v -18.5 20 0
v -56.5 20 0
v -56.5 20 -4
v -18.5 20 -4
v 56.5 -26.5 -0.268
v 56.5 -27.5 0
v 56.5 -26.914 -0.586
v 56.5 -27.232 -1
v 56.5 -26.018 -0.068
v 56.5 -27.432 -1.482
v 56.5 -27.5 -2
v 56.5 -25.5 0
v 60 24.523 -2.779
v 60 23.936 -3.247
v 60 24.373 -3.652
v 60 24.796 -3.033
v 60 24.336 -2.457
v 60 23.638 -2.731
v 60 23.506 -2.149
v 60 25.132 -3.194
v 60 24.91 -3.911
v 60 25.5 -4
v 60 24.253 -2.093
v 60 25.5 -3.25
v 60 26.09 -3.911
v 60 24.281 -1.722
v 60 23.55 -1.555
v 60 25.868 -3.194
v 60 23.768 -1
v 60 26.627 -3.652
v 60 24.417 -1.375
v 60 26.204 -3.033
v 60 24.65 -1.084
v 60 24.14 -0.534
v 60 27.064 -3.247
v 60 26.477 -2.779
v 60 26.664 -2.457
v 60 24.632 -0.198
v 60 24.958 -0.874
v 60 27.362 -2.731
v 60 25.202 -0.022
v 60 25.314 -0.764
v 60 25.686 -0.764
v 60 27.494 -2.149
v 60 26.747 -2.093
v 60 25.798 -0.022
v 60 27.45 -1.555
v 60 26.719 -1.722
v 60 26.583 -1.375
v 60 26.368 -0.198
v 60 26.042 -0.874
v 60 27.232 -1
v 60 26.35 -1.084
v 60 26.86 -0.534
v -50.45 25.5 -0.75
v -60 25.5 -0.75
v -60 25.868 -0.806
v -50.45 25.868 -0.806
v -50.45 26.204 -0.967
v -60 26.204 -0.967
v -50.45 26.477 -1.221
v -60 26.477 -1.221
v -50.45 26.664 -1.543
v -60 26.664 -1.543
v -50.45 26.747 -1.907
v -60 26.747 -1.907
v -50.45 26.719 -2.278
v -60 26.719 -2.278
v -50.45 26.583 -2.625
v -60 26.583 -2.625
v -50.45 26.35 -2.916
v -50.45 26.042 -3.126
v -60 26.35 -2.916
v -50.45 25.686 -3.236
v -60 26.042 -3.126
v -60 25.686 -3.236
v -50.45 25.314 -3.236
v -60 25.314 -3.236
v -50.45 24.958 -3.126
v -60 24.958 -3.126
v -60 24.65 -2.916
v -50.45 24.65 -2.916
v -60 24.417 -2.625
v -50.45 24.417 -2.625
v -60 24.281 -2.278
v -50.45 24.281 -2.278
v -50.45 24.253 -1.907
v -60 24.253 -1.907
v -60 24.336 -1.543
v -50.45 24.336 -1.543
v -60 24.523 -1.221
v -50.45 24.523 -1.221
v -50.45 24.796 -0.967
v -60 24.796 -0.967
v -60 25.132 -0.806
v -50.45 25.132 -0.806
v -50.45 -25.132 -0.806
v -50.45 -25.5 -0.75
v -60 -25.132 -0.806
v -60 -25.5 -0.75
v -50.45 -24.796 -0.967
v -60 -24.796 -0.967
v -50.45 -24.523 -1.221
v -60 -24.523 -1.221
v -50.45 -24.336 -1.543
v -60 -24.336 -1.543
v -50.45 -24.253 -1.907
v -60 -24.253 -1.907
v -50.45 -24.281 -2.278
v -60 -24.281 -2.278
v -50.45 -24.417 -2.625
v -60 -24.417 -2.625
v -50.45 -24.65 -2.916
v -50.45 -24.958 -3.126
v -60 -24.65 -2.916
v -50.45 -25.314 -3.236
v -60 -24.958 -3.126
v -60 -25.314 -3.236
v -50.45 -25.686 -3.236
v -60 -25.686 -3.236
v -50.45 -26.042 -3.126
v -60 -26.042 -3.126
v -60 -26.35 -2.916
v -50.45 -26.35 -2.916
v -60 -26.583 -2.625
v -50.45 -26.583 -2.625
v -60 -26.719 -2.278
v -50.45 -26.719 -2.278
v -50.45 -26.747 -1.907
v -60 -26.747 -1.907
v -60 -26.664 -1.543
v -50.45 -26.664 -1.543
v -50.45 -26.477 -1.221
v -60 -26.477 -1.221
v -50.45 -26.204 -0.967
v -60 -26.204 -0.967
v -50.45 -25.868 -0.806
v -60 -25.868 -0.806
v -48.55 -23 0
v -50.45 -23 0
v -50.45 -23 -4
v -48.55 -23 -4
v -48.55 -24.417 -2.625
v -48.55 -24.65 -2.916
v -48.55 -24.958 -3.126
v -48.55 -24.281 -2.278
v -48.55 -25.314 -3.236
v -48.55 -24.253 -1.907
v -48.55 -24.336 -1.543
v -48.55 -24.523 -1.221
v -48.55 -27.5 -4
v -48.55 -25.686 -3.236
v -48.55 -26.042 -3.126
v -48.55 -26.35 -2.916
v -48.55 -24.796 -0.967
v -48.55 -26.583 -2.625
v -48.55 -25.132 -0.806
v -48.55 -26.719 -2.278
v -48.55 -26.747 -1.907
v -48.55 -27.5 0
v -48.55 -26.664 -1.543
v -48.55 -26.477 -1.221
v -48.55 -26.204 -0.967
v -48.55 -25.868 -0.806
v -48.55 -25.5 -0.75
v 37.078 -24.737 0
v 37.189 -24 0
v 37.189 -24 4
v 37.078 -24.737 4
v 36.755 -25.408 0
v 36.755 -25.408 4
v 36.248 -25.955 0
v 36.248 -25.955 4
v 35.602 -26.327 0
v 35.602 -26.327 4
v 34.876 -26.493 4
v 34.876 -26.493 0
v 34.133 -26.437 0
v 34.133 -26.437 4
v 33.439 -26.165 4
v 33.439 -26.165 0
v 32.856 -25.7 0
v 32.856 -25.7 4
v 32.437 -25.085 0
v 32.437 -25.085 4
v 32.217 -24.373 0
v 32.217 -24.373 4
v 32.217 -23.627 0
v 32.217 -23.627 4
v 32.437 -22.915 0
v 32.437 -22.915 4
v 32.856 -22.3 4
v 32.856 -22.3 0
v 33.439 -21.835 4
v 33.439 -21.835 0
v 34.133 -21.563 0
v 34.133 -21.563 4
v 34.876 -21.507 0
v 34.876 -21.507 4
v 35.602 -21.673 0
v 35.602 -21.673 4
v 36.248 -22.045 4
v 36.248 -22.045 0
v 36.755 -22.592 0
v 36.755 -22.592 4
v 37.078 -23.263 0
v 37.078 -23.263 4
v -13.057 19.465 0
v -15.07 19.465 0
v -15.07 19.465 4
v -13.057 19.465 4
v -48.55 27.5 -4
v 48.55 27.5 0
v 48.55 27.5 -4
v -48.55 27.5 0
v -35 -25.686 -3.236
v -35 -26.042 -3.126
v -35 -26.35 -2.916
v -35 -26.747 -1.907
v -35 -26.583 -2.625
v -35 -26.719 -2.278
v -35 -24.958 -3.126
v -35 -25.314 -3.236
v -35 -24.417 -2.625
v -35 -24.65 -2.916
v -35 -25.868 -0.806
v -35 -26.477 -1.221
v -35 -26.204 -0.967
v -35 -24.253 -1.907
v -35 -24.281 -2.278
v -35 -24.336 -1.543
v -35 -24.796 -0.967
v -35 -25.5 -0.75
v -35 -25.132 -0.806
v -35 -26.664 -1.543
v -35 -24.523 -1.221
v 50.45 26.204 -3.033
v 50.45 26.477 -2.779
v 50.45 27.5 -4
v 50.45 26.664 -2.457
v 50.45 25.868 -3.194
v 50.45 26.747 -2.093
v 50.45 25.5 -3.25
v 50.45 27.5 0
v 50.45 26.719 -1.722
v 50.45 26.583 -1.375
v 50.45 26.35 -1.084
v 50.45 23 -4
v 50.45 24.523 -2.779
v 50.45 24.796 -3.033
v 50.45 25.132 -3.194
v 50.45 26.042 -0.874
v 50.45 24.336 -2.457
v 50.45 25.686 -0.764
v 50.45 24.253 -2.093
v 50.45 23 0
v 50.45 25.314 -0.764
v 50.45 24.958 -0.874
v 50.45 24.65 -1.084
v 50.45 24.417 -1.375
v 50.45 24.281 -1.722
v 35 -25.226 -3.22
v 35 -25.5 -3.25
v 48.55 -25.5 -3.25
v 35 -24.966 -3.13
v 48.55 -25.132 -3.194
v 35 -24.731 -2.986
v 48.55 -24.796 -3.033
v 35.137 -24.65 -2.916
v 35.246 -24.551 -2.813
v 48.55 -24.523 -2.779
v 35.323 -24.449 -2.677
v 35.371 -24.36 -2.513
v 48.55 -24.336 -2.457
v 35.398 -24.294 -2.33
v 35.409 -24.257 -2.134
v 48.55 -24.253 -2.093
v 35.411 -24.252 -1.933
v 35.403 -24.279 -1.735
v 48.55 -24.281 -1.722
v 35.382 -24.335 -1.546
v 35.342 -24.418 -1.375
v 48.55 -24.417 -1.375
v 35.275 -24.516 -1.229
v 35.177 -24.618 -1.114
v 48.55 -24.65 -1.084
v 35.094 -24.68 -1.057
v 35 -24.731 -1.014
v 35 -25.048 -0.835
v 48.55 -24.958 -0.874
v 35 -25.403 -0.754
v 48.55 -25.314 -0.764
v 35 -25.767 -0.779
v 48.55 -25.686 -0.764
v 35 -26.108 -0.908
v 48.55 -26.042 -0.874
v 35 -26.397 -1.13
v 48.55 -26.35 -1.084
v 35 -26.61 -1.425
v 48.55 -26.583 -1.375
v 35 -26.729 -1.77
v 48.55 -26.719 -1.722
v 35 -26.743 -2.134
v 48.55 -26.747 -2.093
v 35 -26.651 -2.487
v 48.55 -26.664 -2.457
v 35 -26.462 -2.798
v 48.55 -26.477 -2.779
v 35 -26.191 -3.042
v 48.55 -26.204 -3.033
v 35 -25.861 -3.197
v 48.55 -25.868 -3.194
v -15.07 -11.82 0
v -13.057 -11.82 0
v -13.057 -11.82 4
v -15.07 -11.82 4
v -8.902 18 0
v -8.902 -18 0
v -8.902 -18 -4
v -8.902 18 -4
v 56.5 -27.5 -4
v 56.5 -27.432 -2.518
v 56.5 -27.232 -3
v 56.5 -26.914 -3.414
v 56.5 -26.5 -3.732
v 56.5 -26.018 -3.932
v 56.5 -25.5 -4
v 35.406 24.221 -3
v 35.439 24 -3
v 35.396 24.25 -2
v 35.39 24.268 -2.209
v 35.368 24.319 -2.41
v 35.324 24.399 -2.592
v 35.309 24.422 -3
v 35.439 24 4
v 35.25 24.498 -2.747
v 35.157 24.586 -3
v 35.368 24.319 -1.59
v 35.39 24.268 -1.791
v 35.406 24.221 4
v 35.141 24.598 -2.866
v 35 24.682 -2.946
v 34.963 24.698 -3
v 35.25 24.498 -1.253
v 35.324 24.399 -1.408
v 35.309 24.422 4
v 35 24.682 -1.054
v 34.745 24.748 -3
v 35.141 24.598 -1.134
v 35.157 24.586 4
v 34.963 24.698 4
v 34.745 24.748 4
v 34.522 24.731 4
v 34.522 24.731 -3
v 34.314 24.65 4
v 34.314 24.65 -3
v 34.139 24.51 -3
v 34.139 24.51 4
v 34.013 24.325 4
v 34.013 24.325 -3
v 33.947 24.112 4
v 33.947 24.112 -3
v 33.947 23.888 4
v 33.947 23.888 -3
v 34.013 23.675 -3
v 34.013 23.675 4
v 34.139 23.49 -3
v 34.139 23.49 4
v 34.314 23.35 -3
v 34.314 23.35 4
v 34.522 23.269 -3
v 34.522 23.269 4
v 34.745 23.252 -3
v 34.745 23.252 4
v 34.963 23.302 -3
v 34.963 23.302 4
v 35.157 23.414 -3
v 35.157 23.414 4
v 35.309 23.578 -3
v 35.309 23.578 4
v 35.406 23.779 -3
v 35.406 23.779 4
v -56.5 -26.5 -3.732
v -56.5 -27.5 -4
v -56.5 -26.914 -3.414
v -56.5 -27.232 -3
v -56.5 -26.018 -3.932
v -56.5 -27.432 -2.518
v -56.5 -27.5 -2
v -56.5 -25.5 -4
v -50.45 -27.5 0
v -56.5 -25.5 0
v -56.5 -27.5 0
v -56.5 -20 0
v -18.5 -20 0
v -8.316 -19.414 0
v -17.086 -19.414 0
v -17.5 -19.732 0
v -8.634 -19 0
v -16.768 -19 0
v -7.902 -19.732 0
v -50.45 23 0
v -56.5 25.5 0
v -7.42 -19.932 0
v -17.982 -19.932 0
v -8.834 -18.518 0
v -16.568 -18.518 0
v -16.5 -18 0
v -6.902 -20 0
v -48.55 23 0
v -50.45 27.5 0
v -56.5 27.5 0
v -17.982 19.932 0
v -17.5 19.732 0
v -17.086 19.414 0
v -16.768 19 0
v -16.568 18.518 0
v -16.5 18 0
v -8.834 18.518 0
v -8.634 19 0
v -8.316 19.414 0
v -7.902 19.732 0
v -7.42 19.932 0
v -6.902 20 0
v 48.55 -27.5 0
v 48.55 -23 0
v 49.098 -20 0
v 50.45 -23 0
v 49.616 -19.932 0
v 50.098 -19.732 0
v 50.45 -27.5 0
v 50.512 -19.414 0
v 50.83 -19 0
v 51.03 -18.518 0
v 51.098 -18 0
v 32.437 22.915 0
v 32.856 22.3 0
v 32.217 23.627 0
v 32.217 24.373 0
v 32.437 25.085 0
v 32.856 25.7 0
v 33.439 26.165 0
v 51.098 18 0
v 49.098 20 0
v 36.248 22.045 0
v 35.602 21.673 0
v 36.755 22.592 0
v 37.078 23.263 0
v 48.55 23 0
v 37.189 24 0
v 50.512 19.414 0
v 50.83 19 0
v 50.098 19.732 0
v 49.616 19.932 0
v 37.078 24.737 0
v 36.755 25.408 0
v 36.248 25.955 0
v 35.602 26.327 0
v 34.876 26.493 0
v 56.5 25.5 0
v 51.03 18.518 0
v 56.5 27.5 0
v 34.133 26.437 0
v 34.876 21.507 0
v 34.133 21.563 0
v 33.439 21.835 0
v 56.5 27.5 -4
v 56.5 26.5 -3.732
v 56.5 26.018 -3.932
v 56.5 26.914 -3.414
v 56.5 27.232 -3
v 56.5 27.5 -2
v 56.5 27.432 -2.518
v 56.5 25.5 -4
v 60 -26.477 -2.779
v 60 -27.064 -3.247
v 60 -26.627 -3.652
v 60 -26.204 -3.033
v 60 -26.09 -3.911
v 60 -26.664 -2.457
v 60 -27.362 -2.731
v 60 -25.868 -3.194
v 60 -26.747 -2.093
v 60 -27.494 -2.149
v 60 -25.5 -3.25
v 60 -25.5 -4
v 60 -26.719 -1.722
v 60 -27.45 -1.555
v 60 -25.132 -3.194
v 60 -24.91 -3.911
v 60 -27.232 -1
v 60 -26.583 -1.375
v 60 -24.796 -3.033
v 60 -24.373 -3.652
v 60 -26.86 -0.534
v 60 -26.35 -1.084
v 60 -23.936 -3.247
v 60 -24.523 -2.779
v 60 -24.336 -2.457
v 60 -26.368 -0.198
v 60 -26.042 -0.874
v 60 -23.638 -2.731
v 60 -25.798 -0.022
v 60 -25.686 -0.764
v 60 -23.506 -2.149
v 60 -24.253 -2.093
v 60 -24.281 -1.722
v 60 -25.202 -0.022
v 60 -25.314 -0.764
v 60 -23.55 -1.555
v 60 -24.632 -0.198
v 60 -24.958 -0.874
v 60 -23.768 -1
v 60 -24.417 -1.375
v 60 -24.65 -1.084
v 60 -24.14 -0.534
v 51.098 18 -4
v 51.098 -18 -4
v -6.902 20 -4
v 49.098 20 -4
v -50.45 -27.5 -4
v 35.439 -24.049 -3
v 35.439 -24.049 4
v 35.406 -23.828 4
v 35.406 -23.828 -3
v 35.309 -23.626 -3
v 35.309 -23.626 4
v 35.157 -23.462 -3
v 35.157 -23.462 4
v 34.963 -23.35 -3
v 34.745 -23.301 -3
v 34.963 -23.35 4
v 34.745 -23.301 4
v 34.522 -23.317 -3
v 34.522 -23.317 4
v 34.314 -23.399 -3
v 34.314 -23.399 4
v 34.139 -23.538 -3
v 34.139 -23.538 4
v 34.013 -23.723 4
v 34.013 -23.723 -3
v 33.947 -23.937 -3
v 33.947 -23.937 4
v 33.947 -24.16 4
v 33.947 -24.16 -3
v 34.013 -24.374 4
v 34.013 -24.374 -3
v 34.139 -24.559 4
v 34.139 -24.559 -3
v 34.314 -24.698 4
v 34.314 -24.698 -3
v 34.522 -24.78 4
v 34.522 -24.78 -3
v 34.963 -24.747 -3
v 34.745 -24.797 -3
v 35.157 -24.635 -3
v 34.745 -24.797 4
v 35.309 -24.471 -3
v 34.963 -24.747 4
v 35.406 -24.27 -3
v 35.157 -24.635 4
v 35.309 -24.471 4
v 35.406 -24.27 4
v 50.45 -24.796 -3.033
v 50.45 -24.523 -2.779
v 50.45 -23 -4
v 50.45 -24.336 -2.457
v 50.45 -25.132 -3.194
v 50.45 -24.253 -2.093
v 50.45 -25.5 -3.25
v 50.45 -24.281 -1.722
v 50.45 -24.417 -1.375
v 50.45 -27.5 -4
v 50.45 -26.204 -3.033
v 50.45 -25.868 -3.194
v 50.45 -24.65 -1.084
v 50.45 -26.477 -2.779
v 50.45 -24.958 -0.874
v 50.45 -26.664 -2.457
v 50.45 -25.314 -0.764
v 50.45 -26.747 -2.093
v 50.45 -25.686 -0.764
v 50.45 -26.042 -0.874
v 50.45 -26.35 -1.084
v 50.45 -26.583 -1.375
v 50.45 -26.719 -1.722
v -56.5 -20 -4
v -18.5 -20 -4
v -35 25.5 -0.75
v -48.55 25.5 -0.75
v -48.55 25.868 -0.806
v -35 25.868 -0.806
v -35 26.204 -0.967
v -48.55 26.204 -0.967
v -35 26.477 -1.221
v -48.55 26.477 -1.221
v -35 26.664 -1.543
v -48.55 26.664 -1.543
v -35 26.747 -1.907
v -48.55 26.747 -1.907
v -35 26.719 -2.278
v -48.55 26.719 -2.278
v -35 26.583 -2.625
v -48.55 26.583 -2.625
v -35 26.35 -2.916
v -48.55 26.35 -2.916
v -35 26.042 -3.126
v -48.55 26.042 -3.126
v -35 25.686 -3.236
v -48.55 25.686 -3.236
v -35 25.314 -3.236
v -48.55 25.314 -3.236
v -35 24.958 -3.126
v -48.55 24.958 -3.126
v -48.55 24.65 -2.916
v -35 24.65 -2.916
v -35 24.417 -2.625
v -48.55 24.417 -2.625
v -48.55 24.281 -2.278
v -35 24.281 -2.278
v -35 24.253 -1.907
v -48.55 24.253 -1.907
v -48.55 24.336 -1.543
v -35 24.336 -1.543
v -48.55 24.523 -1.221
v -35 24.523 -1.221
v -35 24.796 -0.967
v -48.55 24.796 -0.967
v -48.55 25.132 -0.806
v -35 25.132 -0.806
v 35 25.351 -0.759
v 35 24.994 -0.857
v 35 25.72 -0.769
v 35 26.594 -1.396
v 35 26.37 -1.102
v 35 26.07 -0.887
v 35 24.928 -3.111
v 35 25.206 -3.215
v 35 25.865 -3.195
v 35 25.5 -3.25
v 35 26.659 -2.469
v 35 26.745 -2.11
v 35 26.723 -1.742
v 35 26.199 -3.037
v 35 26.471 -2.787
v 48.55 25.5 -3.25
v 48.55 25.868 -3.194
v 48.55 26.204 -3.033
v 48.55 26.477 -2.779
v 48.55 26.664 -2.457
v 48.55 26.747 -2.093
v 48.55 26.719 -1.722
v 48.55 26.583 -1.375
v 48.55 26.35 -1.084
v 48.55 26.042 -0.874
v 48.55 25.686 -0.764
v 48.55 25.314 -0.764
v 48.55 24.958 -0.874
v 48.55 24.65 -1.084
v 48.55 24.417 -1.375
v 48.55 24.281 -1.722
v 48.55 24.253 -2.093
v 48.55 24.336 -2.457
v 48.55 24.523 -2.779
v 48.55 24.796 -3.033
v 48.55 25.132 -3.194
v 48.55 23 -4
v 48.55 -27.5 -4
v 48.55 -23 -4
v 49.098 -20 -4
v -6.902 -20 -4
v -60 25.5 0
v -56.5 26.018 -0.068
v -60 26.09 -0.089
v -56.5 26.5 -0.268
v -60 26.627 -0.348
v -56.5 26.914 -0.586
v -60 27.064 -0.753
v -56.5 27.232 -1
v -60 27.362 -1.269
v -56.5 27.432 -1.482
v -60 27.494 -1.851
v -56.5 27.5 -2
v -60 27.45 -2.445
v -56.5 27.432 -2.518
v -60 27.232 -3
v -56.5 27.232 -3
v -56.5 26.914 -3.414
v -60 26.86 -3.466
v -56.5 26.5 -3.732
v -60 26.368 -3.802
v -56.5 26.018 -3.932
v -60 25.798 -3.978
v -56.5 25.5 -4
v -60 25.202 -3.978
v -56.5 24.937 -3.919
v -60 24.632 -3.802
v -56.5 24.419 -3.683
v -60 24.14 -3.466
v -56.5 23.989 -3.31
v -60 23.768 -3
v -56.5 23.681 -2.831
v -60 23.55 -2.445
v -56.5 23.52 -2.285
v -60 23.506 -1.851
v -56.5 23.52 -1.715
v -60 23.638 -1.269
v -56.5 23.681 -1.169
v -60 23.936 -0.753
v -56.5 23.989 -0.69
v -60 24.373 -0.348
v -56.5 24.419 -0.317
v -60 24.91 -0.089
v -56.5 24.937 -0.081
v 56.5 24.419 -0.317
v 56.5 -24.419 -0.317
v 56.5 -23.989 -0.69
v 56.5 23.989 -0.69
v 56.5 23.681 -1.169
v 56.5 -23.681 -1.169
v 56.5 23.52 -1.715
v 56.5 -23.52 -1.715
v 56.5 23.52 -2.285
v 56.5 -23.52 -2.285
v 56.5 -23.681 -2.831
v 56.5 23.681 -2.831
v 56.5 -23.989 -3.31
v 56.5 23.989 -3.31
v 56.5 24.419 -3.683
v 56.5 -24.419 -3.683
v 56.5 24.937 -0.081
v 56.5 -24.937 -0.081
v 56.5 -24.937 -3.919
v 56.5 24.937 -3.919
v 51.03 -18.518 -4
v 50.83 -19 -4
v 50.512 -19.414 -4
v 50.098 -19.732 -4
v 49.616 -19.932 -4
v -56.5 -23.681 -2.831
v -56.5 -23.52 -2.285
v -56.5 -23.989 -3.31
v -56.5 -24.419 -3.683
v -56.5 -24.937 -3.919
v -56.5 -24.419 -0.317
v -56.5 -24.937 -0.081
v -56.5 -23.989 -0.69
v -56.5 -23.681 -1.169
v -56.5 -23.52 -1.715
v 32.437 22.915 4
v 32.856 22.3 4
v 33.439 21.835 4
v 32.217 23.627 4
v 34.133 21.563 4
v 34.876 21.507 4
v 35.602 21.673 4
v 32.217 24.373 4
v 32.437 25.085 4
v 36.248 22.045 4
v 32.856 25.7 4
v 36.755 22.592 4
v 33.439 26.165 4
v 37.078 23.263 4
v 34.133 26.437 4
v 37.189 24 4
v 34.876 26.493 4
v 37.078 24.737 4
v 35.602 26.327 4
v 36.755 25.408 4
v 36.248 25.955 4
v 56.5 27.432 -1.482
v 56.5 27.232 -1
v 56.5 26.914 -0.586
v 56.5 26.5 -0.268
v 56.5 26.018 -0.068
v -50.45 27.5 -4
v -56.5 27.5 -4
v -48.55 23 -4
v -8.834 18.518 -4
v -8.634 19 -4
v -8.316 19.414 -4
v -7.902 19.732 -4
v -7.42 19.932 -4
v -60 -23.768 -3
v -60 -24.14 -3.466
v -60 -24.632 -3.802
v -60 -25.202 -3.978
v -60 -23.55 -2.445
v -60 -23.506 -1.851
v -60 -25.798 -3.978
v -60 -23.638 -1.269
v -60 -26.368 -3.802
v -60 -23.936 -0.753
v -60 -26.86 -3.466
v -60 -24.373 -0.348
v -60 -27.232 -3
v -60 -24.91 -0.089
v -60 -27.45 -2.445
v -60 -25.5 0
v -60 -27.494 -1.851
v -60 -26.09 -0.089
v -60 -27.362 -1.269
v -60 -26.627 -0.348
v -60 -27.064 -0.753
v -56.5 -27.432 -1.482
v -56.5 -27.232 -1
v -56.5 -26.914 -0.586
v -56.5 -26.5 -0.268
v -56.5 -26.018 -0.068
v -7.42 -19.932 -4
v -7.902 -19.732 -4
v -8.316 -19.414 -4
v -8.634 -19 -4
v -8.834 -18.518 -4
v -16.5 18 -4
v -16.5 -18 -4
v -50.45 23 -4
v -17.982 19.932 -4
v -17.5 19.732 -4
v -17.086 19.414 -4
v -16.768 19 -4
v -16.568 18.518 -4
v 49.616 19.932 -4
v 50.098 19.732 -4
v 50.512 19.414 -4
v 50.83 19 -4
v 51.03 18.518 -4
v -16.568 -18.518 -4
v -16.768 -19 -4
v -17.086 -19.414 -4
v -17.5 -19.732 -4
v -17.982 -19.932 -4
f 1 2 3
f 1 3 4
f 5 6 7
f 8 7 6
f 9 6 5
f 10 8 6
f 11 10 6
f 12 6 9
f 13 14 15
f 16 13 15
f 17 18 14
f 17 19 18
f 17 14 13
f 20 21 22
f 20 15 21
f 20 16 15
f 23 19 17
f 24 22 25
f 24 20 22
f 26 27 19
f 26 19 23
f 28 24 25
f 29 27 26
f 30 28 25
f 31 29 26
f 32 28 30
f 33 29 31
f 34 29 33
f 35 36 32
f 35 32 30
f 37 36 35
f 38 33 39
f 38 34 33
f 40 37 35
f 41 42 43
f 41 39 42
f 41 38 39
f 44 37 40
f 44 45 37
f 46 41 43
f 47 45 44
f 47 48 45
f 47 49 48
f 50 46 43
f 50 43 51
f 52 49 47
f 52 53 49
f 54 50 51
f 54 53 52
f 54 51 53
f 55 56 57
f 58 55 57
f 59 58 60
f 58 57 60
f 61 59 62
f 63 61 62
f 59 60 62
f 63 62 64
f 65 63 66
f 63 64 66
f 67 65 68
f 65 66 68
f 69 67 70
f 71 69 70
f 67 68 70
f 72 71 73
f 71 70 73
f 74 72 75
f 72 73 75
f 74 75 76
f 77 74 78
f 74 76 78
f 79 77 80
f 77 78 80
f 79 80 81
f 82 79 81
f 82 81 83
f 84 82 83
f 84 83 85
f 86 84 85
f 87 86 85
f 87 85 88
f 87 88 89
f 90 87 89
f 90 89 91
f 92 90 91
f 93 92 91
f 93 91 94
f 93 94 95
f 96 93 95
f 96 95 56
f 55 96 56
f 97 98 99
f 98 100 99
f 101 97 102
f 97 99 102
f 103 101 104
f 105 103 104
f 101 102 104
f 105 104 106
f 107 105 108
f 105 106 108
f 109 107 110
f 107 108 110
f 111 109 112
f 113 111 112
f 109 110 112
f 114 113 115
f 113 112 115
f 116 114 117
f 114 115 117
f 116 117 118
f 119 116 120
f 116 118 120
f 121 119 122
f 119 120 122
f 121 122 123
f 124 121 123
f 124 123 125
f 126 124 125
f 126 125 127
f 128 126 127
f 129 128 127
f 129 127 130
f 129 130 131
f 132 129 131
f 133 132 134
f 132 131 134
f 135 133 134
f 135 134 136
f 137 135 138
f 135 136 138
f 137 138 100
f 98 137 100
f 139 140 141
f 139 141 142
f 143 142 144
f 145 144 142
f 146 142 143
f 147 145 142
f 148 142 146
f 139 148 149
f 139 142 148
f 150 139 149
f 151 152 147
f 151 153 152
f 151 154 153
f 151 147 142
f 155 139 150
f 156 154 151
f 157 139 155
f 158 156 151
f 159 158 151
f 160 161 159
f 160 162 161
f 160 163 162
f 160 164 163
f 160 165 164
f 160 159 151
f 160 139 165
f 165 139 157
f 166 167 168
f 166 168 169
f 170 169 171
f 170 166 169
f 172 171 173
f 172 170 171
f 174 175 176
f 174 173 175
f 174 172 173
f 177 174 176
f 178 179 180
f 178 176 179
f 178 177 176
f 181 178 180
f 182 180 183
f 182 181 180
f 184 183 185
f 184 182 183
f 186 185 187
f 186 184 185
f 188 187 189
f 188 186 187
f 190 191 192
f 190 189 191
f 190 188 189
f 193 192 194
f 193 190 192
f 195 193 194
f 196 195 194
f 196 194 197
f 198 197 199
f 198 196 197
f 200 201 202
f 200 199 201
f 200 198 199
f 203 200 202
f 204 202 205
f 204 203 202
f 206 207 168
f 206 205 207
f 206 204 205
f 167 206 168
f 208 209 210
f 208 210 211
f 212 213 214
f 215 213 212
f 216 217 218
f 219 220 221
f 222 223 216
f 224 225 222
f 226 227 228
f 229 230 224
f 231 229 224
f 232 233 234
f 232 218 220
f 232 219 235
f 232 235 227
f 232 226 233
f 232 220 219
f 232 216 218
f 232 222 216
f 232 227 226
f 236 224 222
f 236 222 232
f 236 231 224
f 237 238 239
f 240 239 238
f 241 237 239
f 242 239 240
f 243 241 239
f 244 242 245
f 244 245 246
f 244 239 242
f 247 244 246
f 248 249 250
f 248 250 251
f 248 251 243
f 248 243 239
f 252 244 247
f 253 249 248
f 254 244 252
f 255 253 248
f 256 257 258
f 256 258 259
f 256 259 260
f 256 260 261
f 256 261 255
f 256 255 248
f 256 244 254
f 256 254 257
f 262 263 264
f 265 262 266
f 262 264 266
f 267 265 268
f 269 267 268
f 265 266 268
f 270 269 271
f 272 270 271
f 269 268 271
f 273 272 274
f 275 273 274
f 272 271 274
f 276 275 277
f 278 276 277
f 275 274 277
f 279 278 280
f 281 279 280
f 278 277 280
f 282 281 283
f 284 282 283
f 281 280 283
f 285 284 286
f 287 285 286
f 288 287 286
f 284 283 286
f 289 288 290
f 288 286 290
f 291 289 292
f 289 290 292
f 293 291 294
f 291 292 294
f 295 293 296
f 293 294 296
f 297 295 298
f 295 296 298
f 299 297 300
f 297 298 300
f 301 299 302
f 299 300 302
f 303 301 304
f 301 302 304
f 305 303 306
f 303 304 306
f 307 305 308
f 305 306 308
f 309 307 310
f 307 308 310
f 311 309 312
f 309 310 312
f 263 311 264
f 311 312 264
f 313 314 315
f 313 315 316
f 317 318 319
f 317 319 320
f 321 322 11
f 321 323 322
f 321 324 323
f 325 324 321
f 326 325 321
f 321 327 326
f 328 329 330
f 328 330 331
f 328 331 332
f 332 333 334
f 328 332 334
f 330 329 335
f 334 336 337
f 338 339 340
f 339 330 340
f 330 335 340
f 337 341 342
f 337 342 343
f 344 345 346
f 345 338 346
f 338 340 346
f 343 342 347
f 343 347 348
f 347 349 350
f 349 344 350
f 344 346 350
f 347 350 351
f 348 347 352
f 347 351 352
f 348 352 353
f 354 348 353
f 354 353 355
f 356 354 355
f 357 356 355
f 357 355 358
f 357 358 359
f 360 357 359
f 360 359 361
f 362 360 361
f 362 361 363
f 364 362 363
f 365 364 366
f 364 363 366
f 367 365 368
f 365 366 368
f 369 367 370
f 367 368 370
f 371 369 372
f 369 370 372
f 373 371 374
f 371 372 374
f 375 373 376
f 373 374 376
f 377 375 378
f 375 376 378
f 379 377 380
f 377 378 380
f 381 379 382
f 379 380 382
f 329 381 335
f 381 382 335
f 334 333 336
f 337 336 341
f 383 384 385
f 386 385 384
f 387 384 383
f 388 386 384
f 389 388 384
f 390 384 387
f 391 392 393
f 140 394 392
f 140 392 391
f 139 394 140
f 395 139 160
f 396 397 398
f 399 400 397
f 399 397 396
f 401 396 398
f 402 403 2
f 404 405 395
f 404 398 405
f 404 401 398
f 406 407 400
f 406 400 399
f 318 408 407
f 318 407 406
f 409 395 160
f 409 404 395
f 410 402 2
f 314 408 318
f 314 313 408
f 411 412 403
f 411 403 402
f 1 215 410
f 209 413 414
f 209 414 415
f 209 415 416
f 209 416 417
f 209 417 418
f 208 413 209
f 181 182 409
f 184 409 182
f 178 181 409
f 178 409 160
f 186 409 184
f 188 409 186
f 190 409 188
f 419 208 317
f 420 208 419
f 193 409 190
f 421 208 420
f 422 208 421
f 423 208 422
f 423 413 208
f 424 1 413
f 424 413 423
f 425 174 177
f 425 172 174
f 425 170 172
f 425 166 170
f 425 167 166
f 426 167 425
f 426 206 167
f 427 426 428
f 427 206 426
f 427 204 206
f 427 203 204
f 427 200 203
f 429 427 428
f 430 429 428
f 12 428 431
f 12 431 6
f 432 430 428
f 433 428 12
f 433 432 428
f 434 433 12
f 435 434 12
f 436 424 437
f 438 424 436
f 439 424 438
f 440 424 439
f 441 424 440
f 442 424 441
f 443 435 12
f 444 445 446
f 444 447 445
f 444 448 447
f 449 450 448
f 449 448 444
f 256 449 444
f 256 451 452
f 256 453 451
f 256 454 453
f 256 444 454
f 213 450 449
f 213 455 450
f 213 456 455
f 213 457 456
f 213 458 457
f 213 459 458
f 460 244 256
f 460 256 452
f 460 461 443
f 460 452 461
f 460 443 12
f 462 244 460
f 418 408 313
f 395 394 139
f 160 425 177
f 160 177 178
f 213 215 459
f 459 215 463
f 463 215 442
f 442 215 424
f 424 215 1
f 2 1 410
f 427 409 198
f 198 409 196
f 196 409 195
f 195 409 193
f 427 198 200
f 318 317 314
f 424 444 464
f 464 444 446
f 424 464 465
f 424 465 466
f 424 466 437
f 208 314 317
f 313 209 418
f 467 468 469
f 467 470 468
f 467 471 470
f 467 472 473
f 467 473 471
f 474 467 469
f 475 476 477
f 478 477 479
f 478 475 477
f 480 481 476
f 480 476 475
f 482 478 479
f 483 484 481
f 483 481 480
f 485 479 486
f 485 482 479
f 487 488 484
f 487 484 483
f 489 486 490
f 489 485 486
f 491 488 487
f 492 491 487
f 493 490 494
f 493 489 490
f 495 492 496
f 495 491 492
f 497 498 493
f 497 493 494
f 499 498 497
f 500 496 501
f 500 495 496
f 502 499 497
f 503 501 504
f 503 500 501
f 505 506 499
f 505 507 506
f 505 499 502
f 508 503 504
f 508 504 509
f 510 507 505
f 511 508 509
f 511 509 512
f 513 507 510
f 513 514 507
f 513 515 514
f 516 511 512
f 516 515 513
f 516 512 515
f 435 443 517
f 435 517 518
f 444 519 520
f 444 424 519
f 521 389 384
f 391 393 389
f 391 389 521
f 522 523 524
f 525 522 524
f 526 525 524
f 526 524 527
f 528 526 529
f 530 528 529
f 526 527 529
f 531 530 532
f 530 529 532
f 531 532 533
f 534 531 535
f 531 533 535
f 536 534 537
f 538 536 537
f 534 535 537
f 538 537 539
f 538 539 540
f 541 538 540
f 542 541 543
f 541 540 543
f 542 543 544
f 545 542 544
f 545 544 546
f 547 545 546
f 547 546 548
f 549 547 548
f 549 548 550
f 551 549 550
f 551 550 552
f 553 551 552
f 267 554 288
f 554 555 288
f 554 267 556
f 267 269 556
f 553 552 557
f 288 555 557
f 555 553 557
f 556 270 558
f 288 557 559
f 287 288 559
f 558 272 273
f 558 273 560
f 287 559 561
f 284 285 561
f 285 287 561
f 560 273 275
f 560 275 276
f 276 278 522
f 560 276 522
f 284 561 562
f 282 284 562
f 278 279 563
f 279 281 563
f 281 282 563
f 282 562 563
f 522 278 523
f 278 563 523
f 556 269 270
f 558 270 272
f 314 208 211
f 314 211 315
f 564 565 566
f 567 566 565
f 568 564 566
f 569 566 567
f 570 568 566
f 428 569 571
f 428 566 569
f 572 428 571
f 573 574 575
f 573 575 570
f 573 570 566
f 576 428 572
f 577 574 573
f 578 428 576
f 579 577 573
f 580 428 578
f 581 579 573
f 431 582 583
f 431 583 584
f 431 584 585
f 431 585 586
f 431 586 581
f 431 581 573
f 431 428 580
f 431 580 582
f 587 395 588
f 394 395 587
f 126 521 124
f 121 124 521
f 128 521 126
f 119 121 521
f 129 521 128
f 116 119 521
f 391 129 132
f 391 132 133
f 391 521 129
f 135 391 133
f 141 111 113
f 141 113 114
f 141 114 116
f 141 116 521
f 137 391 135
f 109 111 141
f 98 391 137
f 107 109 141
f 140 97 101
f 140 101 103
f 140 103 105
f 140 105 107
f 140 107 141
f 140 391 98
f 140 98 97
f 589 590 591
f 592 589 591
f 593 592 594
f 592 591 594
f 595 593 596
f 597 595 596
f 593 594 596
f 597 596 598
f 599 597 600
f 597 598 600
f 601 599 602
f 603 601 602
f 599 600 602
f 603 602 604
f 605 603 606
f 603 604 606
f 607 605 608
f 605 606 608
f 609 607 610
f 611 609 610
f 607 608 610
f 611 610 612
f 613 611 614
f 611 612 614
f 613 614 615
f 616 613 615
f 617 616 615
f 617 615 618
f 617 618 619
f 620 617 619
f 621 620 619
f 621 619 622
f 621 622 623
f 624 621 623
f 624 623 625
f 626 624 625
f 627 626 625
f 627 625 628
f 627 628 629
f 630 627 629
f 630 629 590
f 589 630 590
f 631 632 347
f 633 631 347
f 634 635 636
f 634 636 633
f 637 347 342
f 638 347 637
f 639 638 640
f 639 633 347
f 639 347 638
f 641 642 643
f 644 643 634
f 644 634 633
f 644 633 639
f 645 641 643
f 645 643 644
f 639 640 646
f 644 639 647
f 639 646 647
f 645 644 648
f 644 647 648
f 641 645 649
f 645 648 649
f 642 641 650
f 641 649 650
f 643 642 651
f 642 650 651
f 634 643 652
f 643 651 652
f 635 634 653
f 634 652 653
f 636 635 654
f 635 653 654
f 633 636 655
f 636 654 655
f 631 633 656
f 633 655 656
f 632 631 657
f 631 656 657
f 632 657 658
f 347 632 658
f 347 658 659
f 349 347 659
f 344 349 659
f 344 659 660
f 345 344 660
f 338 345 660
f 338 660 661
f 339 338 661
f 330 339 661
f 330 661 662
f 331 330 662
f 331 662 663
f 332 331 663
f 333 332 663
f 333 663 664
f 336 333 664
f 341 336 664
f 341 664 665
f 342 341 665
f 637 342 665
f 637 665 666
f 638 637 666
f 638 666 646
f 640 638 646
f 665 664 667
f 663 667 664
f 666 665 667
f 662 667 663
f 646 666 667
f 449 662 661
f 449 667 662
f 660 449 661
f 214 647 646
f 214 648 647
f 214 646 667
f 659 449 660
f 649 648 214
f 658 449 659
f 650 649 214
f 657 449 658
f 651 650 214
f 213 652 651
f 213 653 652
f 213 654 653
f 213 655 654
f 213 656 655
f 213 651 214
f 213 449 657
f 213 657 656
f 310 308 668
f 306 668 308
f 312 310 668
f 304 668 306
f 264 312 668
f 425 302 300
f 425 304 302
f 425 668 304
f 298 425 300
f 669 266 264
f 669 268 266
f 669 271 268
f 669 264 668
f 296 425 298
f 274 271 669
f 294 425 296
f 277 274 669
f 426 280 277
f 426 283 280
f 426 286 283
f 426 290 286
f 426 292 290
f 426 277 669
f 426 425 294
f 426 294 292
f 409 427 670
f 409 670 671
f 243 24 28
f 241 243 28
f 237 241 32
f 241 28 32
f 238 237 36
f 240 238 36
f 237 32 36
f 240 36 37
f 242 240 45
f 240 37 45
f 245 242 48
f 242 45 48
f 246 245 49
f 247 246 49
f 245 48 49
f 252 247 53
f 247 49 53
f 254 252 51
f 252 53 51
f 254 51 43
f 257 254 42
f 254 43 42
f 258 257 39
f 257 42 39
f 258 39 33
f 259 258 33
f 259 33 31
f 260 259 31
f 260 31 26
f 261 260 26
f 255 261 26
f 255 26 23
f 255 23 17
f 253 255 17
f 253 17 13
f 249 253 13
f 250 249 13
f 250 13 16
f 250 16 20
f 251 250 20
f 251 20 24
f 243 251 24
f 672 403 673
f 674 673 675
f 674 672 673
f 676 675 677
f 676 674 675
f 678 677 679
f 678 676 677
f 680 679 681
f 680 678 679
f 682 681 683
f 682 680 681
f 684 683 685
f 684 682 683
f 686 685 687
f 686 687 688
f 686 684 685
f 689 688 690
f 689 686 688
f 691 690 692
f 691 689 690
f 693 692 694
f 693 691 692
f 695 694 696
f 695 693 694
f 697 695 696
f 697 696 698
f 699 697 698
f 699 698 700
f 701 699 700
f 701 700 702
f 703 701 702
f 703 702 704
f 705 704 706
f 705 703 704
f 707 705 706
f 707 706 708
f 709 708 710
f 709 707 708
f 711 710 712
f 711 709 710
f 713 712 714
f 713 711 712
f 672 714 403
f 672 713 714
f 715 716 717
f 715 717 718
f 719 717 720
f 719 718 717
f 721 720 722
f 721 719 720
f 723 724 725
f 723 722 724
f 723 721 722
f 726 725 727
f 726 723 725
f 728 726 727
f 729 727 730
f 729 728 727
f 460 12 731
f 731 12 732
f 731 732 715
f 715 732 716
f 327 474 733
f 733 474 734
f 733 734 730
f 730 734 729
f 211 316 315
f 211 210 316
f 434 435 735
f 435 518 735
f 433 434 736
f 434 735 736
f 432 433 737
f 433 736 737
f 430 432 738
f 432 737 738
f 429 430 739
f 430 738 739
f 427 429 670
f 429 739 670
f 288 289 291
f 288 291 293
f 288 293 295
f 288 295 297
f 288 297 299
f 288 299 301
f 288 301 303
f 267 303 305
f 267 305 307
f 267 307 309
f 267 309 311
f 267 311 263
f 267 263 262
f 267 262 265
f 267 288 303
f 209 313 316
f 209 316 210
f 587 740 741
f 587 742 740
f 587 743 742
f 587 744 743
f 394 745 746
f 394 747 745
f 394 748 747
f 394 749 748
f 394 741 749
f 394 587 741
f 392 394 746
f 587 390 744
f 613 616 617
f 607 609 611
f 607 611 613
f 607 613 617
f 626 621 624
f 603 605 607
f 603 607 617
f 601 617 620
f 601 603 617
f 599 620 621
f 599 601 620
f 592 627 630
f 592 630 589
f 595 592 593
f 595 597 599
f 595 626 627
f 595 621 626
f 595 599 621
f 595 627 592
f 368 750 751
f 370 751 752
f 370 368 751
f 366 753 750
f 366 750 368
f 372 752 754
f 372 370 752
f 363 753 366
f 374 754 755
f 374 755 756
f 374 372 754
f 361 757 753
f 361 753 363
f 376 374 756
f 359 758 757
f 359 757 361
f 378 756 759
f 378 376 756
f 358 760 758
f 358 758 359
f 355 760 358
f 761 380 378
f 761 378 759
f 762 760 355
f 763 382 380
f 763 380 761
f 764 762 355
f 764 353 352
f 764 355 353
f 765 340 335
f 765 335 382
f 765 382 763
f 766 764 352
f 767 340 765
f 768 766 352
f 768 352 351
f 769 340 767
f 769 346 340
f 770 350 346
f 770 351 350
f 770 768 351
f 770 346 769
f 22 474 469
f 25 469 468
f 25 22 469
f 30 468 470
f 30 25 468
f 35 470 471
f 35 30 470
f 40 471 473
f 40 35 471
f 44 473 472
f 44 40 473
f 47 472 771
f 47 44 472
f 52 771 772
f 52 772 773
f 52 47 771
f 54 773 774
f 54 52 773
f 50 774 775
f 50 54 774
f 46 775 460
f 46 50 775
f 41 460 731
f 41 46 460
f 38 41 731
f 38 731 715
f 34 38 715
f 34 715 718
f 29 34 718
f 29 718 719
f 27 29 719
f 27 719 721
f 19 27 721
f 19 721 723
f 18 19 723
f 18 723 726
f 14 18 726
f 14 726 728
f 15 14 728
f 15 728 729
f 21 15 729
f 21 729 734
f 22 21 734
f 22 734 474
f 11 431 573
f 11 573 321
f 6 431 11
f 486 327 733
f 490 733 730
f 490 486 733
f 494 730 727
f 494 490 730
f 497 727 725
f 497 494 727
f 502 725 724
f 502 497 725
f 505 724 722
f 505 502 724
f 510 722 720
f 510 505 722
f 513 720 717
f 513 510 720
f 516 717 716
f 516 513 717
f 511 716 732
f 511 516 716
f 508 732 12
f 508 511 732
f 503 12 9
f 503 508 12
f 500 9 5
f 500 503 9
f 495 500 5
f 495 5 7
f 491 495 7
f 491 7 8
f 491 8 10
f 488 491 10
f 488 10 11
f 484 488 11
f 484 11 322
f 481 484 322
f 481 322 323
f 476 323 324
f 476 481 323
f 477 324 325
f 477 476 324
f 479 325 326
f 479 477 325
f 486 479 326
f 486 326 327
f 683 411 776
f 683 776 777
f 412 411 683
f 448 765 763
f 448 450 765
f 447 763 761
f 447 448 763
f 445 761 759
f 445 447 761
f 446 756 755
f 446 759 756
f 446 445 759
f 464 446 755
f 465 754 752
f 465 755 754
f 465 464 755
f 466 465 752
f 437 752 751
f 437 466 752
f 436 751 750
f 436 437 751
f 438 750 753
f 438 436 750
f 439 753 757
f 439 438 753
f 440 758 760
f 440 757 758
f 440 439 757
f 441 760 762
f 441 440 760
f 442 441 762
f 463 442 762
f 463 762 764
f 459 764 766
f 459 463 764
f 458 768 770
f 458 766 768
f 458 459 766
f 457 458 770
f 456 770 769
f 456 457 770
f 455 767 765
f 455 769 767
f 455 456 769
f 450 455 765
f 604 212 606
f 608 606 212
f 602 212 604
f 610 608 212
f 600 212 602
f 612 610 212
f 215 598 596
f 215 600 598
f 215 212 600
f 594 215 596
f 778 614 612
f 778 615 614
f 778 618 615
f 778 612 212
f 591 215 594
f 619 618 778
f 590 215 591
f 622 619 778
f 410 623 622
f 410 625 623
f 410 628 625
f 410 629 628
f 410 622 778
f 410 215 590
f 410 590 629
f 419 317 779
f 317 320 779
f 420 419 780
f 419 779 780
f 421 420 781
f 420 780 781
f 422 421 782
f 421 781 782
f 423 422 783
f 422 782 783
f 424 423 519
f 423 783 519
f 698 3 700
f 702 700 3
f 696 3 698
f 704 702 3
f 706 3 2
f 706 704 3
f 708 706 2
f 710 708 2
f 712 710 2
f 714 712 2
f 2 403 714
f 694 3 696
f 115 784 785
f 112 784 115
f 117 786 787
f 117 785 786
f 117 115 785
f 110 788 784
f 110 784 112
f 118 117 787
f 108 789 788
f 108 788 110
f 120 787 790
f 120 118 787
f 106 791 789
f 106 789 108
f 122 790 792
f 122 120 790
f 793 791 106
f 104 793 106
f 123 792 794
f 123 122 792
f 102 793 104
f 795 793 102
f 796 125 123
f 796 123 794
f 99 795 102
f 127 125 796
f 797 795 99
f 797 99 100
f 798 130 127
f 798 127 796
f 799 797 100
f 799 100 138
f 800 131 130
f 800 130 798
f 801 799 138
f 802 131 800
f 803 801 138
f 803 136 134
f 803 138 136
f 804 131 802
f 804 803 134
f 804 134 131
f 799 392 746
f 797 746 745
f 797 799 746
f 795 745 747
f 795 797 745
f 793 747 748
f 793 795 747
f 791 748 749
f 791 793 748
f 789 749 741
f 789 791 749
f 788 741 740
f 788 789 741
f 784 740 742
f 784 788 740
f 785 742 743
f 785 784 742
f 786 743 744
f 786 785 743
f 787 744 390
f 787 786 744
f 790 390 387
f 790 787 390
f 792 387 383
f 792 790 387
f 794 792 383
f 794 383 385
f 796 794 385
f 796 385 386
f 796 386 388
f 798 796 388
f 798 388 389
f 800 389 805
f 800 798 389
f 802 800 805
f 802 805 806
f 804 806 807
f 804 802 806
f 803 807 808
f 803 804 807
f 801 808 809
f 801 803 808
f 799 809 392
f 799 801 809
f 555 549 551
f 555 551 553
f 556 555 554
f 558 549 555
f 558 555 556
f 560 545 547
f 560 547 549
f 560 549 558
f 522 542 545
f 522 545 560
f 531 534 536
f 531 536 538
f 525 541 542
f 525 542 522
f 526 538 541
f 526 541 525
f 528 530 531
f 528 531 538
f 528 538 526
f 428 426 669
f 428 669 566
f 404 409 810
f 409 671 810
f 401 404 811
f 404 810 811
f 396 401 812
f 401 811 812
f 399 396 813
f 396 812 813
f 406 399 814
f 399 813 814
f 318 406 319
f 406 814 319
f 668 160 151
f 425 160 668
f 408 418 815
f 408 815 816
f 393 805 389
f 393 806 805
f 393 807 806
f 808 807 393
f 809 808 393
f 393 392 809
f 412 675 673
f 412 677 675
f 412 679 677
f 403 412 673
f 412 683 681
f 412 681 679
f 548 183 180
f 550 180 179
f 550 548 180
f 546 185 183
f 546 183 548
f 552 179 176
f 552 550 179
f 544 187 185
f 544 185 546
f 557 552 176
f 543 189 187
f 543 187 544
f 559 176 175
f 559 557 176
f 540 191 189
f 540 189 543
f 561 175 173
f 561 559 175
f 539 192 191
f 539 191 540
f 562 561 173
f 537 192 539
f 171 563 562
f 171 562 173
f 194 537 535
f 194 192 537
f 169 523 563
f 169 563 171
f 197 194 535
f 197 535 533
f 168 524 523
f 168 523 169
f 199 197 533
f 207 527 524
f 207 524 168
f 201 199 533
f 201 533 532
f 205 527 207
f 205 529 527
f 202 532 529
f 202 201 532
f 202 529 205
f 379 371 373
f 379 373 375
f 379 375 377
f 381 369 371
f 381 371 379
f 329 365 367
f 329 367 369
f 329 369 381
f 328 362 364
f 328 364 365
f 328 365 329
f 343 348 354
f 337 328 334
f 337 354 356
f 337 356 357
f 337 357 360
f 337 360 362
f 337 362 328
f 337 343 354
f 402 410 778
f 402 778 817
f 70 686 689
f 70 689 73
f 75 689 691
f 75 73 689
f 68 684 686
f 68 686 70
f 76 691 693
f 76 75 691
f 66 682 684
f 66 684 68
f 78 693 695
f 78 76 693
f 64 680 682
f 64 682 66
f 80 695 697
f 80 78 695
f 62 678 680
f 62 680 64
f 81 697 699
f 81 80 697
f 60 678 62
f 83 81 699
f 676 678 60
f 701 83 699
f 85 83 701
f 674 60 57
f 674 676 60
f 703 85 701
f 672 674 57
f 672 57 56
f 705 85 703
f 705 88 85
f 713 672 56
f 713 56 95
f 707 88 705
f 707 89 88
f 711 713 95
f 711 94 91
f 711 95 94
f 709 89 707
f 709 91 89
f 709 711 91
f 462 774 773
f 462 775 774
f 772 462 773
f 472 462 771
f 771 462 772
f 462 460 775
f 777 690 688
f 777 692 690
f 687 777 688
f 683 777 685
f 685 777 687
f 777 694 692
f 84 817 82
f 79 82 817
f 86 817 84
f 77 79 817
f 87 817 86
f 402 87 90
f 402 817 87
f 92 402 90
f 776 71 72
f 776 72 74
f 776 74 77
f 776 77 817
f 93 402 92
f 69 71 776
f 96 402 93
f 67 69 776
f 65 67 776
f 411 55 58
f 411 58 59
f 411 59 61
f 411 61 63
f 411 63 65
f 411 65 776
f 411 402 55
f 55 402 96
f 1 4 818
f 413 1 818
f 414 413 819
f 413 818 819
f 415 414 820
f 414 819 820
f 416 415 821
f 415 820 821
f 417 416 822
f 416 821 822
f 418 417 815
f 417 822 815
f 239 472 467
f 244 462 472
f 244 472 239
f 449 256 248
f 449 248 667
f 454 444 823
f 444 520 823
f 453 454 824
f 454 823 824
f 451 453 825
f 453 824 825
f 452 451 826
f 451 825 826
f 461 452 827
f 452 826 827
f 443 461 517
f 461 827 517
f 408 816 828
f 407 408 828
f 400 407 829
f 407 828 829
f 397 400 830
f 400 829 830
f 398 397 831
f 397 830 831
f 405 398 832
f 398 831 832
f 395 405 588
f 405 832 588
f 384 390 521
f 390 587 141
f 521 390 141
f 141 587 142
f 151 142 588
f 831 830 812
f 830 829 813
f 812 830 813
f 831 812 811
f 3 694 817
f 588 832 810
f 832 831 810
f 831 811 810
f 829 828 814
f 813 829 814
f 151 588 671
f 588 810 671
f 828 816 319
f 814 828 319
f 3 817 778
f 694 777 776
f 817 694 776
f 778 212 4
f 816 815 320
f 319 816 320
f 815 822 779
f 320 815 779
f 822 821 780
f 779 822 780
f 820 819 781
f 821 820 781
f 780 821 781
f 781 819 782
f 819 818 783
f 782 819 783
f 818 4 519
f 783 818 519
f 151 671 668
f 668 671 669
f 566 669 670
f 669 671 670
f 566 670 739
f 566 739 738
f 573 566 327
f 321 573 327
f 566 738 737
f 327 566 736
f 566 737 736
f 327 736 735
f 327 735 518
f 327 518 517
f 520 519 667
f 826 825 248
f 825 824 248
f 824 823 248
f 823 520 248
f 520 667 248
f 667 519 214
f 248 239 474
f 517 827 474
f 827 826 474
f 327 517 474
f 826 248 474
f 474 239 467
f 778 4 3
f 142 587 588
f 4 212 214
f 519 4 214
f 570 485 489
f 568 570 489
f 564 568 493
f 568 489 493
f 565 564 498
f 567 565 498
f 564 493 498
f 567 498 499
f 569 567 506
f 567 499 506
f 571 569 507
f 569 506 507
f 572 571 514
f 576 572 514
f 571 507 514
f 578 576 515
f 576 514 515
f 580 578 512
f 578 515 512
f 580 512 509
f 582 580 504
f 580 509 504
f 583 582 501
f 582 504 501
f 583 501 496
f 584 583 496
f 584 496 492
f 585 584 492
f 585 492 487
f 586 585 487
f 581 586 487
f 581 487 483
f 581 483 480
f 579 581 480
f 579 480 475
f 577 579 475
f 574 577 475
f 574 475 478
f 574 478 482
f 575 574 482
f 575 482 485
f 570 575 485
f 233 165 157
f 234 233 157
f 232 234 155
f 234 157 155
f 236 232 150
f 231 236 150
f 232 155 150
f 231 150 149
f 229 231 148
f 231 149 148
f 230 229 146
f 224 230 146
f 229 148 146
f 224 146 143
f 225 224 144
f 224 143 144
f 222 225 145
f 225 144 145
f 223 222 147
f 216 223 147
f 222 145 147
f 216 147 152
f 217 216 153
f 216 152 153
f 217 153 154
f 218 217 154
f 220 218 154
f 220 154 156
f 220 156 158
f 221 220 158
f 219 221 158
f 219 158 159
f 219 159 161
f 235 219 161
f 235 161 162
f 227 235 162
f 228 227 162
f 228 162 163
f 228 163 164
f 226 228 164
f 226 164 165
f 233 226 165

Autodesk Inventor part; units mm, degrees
ref_plane "YZ Plane" through (0, 0, 0) normal (1, 0, 0) x (0, 1, 0)
sketch "Sketch1" plane through (0, 0, 0) normal (0, 0, 1) x (1, 0, 0)
  line L0 (-60, -27.5) -> (60, -27.5)
  line L1 (60, -27.5) -> (60, 27.5)
  line L2 (60, 27.5) -> (-60, 27.5)
  line L3 (-60, 27.5) -> (-60, -27.5)
  line L4 (-60, -27.5) -> (60, 27.5) construction
  line L5 (60, -27.5) -> (-60, 27.5) construction
  point P0 (0, 0)
  dimension "d0" = 120
  dimension "d1" = 55
extrude "Extrusion1" add sketch "Sketch1" against normal blind 4
sketch "Sketch2" plane through (60, -27.5, 0) normal (1, 0, 0) x (0, 0, -1)
  circle A0 centre (2, 2) radius 2
  line L0 (0, 0) -> (4, 0) projected
  line L1 (4, 55) -> (4, 0) projected
  circle A1 centre (2, 2) radius 1.25
  circle A2 centre (2, 53) radius 2
  line L2 (0, 55) -> (4, 55) projected
  circle A3 centre (2, 53) radius 1.25
  line L3 (0, 55) -> (0, 0) projected
  line L4 (0, 55) -> (4, 55)
  line L5 (4, 55) -> (4, 0)
  line L6 (4, 0) -> (0, 0)
  line L7 (0, 0) -> (0, 55)
  point P0 (0, 27.5)
  dimension "d4" = 4
  dimension "d5" = 2.5
  dimension "d6" = 4
  dimension "d7" = 2.5
extrude "Extrusion2" cut sketch "Sketch2" against normal blind 3.5 contours L1 L0 A0 | A0 L3 A2 L1 | A0 L0 L3 | A2 L2 L1 | L3 L2 A2
extrude "Extrusion3" cut sketch "Sketch2" against normal blind 25 contours A1
extrude "Extrusion4" cut sketch "Sketch2" against normal blind 25 contours A3
sketch "Sketch3" plane through (-60, -27.5, 0) normal (-1, 0, 0) x (0, 0, 1)
  circle A0 centre (-2, 2) radius 2
  circle A1 centre (-2, 53) radius 2
  line L0 (0, 0) -> (-4, 0) projected
  line L1 (-4, 0) -> (-4, 55) projected
  line L2 (0, 55) -> (-4, 55) projected
  line L3 (0, 55) -> (0, 0) projected
  line L4 (-4, 0) -> (0, 0)
  line L5 (0, 0) -> (0, 55)
  line L6 (0, 55) -> (-4, 55)
  line L7 (-4, 55) -> (-4, 0)
  circle A2 centre (-2, 2) radius 1.25 projected
  circle A3 centre (-2, 2) radius 1.25
  circle A4 centre (-2, 53) radius 1.25 projected
  circle A5 centre (-2, 53) radius 1.25
  point P0 (0, 27.5)
  dimension "d14" = 4
  dimension "d15" = 4
  dimension "d16" = 2.5
  dimension "d17" = 2.5
extrude "Extrusion5" cut sketch "Sketch3" against normal blind 3.5 contours L3 L0 A0 | A0 L1 A1 L3 | A0 L0 L1 | A1 L2 L3 | L1 L2 A1
extrude "Extrusion6" cut sketch "Sketch3" against normal blind 25 contours A4
extrude "Extrusion7" cut sketch "Sketch3" against normal blind 25 contours A2
sketch "Sketch4" plane through (0, 0, 0) normal (0, 0, 1) x (1, 0, 0)
  line L0 (-56.5, 27.5) -> (56.5, 27.5) projected
  line L1 (56.5, -27.5) -> (-56.5, -27.5) projected
  line L2 (-56.5, 27.5) -> (56.5, 27.5)
  line L3 (56.5, 27.5) -> (56.5, -27.5)
  line L4 (56.5, -27.5) -> (-56.5, -27.5)
  line L5 (-56.5, -27.5) -> (-56.5, 27.5)
  line L6 (-73.441, 25.5) -> (75.6749, 25.5) construction
  line L7 (-49.5, 37.9771) -> (-49.5, -42.6684) construction
  line L8 (-50.45, 28) -> (-48.55, 28)
  line L9 (-48.55, 28) -> (-48.55, 23)
  line L10 (-48.55, 23) -> (-50.45, 23)
  line L11 (-50.45, 23) -> (-50.45, 28)
  line L12 (-50.45, 28) -> (-48.55, 23) construction
  line L13 (-48.55, 28) -> (-50.45, 23) construction
  point P0 (0, 0)
  point P1 (-49.5, 25.5)
  dimension "d24" = 2
  dimension "d25" = 7
  dimension "d26" = 1.9
  dimension "d27" = 5
extrude "Extrusion8" cut sketch "Sketch4" against normal blind 25 contours L11 L8 L9 L0 | L0 L9 L10 L11
ref_plane "Work Plane1" through (0, -27.5, 0) normal (1, 0, 0) x (0, 0, -1)
ref_plane "Work Plane2" through (-48.55, 0, 0) normal (0, 1, 0) x (1, 0, 0)
mirror "Mirror1" about plane through (0, -27.5, 0) normal (1, 0, 0) of "Extrusion8"
mirror "Mirror3" about plane through (-48.55, 0, 0) normal (0, 1, 0) of "Extrusion8", "Mirror1"
sketch "Sketch5" plane through (0, 0, 0) normal (0, 0, 1) x (1, 0, 0)
  line L0 (-20.311, 26.3647) -> (47.689, 26.3647) construction
  line L1 (47.689, 26.3647) -> (47.689, -26.6353) construction
  line L2 (47.689, -26.6353) -> (-20.311, -26.6353) construction
  line L3 (-20.311, -26.6353) -> (-20.311, 26.3647) construction
  line L4 (34.689, 35.6432) -> (34.689, -53.7477) construction
  line L5 (-67.7221, 24) -> (59.2356, 24) construction
  line L6 (-64.2143, -24) -> (60.4803, -24) construction
  line L7 (-93.3625, 0) -> (86.1208, 0) construction
  circle A0 centre (34.689, 24) radius 2.5
  circle A1 centre (34.689, -24) radius 2.5
  line L8 (-15.0696, 19.4646) -> (-13.0566, 19.4646)
  line L9 (-13.0566, 19.4646) -> (-13.0566, -11.8201)
  line L10 (-13.0566, -11.8201) -> (-15.0696, -11.8201)
  line L11 (-15.0696, -11.8201) -> (-15.0696, 19.4646)
  circle A2 centre (34.689, 24) radius 0.75
  circle A3 centre (34.689, -24) radius 0.75
  point P0 (0, 0)
  dimension "d30" = 68
  dimension "d31" = 53
  dimension "d32" = 13
  dimension "d34" = 48
  dimension "d35" = 24
  dimension "d36" = 5
  dimension "d37" = 5
  dimension "d42" = 1.5
  dimension "d43" = 1.5
extrude "Extrusion9" add sketch "Sketch5" along normal blind 4 contours A0 | A1 | A2 | A3
extrude "Extrusion10" add sketch "Sketch5" along normal blind 4 contours L8 L9 L10 L11
sketch "Sketch6" plane through (34.689, 24, 4) normal (0, 0, 1) x (1, 0, 0)
  circle A0 centre (0, 0) radius 0.75
  circle A1 centre (0, -48.0486) radius 0.75
  point P0 (-34.689, -24)
  dimension "d44" = 1.5
  dimension "d45" = 1.5
extrude "Extrusion11" cut sketch "Sketch6" against normal blind 7
sketch "Sketch7" plane through (0, 0, 0) normal (0, 0, 1) x (1, 0, 0)
  line L0 (-56.5, -25.5) -> (-56.5, 25.5) projected
  line L1 (-56.5, 20) -> (-16.5, 20)
  line L2 (-16.5, 20) -> (-16.5, -20)
  line L3 (-16.5, -20) -> (-56.5, -20)
  line L4 (-56.5, -20) -> (-56.5, 20)
  line L5 (48.55, 27.5) -> (-48.55, 27.5) projected
  line L6 (-8.902, 20) -> (51.098, 20)
  line L7 (51.098, 20) -> (51.098, -20)
  line L8 (51.098, -20) -> (-8.902, -20)
  line L9 (-8.902, -20) -> (-8.902, 20)
  point P0 (0, 0)
  dimension "d48" = 40
  dimension "d49" = 40
  dimension "d50" = 7.5
  dimension "d51" = 60
extrude "Extrusion12" cut sketch "Sketch7" against normal blind 7
fillet "Fillet1" radius 2 6 edges at (-16.5, -20, -2) (-16.5, 20, -2) (-8.902, 20, -2) (-8.902, -20, -2) (51.098, 20, -2) (51.098, -20, -2)
properties part number "Drivercarrier"
